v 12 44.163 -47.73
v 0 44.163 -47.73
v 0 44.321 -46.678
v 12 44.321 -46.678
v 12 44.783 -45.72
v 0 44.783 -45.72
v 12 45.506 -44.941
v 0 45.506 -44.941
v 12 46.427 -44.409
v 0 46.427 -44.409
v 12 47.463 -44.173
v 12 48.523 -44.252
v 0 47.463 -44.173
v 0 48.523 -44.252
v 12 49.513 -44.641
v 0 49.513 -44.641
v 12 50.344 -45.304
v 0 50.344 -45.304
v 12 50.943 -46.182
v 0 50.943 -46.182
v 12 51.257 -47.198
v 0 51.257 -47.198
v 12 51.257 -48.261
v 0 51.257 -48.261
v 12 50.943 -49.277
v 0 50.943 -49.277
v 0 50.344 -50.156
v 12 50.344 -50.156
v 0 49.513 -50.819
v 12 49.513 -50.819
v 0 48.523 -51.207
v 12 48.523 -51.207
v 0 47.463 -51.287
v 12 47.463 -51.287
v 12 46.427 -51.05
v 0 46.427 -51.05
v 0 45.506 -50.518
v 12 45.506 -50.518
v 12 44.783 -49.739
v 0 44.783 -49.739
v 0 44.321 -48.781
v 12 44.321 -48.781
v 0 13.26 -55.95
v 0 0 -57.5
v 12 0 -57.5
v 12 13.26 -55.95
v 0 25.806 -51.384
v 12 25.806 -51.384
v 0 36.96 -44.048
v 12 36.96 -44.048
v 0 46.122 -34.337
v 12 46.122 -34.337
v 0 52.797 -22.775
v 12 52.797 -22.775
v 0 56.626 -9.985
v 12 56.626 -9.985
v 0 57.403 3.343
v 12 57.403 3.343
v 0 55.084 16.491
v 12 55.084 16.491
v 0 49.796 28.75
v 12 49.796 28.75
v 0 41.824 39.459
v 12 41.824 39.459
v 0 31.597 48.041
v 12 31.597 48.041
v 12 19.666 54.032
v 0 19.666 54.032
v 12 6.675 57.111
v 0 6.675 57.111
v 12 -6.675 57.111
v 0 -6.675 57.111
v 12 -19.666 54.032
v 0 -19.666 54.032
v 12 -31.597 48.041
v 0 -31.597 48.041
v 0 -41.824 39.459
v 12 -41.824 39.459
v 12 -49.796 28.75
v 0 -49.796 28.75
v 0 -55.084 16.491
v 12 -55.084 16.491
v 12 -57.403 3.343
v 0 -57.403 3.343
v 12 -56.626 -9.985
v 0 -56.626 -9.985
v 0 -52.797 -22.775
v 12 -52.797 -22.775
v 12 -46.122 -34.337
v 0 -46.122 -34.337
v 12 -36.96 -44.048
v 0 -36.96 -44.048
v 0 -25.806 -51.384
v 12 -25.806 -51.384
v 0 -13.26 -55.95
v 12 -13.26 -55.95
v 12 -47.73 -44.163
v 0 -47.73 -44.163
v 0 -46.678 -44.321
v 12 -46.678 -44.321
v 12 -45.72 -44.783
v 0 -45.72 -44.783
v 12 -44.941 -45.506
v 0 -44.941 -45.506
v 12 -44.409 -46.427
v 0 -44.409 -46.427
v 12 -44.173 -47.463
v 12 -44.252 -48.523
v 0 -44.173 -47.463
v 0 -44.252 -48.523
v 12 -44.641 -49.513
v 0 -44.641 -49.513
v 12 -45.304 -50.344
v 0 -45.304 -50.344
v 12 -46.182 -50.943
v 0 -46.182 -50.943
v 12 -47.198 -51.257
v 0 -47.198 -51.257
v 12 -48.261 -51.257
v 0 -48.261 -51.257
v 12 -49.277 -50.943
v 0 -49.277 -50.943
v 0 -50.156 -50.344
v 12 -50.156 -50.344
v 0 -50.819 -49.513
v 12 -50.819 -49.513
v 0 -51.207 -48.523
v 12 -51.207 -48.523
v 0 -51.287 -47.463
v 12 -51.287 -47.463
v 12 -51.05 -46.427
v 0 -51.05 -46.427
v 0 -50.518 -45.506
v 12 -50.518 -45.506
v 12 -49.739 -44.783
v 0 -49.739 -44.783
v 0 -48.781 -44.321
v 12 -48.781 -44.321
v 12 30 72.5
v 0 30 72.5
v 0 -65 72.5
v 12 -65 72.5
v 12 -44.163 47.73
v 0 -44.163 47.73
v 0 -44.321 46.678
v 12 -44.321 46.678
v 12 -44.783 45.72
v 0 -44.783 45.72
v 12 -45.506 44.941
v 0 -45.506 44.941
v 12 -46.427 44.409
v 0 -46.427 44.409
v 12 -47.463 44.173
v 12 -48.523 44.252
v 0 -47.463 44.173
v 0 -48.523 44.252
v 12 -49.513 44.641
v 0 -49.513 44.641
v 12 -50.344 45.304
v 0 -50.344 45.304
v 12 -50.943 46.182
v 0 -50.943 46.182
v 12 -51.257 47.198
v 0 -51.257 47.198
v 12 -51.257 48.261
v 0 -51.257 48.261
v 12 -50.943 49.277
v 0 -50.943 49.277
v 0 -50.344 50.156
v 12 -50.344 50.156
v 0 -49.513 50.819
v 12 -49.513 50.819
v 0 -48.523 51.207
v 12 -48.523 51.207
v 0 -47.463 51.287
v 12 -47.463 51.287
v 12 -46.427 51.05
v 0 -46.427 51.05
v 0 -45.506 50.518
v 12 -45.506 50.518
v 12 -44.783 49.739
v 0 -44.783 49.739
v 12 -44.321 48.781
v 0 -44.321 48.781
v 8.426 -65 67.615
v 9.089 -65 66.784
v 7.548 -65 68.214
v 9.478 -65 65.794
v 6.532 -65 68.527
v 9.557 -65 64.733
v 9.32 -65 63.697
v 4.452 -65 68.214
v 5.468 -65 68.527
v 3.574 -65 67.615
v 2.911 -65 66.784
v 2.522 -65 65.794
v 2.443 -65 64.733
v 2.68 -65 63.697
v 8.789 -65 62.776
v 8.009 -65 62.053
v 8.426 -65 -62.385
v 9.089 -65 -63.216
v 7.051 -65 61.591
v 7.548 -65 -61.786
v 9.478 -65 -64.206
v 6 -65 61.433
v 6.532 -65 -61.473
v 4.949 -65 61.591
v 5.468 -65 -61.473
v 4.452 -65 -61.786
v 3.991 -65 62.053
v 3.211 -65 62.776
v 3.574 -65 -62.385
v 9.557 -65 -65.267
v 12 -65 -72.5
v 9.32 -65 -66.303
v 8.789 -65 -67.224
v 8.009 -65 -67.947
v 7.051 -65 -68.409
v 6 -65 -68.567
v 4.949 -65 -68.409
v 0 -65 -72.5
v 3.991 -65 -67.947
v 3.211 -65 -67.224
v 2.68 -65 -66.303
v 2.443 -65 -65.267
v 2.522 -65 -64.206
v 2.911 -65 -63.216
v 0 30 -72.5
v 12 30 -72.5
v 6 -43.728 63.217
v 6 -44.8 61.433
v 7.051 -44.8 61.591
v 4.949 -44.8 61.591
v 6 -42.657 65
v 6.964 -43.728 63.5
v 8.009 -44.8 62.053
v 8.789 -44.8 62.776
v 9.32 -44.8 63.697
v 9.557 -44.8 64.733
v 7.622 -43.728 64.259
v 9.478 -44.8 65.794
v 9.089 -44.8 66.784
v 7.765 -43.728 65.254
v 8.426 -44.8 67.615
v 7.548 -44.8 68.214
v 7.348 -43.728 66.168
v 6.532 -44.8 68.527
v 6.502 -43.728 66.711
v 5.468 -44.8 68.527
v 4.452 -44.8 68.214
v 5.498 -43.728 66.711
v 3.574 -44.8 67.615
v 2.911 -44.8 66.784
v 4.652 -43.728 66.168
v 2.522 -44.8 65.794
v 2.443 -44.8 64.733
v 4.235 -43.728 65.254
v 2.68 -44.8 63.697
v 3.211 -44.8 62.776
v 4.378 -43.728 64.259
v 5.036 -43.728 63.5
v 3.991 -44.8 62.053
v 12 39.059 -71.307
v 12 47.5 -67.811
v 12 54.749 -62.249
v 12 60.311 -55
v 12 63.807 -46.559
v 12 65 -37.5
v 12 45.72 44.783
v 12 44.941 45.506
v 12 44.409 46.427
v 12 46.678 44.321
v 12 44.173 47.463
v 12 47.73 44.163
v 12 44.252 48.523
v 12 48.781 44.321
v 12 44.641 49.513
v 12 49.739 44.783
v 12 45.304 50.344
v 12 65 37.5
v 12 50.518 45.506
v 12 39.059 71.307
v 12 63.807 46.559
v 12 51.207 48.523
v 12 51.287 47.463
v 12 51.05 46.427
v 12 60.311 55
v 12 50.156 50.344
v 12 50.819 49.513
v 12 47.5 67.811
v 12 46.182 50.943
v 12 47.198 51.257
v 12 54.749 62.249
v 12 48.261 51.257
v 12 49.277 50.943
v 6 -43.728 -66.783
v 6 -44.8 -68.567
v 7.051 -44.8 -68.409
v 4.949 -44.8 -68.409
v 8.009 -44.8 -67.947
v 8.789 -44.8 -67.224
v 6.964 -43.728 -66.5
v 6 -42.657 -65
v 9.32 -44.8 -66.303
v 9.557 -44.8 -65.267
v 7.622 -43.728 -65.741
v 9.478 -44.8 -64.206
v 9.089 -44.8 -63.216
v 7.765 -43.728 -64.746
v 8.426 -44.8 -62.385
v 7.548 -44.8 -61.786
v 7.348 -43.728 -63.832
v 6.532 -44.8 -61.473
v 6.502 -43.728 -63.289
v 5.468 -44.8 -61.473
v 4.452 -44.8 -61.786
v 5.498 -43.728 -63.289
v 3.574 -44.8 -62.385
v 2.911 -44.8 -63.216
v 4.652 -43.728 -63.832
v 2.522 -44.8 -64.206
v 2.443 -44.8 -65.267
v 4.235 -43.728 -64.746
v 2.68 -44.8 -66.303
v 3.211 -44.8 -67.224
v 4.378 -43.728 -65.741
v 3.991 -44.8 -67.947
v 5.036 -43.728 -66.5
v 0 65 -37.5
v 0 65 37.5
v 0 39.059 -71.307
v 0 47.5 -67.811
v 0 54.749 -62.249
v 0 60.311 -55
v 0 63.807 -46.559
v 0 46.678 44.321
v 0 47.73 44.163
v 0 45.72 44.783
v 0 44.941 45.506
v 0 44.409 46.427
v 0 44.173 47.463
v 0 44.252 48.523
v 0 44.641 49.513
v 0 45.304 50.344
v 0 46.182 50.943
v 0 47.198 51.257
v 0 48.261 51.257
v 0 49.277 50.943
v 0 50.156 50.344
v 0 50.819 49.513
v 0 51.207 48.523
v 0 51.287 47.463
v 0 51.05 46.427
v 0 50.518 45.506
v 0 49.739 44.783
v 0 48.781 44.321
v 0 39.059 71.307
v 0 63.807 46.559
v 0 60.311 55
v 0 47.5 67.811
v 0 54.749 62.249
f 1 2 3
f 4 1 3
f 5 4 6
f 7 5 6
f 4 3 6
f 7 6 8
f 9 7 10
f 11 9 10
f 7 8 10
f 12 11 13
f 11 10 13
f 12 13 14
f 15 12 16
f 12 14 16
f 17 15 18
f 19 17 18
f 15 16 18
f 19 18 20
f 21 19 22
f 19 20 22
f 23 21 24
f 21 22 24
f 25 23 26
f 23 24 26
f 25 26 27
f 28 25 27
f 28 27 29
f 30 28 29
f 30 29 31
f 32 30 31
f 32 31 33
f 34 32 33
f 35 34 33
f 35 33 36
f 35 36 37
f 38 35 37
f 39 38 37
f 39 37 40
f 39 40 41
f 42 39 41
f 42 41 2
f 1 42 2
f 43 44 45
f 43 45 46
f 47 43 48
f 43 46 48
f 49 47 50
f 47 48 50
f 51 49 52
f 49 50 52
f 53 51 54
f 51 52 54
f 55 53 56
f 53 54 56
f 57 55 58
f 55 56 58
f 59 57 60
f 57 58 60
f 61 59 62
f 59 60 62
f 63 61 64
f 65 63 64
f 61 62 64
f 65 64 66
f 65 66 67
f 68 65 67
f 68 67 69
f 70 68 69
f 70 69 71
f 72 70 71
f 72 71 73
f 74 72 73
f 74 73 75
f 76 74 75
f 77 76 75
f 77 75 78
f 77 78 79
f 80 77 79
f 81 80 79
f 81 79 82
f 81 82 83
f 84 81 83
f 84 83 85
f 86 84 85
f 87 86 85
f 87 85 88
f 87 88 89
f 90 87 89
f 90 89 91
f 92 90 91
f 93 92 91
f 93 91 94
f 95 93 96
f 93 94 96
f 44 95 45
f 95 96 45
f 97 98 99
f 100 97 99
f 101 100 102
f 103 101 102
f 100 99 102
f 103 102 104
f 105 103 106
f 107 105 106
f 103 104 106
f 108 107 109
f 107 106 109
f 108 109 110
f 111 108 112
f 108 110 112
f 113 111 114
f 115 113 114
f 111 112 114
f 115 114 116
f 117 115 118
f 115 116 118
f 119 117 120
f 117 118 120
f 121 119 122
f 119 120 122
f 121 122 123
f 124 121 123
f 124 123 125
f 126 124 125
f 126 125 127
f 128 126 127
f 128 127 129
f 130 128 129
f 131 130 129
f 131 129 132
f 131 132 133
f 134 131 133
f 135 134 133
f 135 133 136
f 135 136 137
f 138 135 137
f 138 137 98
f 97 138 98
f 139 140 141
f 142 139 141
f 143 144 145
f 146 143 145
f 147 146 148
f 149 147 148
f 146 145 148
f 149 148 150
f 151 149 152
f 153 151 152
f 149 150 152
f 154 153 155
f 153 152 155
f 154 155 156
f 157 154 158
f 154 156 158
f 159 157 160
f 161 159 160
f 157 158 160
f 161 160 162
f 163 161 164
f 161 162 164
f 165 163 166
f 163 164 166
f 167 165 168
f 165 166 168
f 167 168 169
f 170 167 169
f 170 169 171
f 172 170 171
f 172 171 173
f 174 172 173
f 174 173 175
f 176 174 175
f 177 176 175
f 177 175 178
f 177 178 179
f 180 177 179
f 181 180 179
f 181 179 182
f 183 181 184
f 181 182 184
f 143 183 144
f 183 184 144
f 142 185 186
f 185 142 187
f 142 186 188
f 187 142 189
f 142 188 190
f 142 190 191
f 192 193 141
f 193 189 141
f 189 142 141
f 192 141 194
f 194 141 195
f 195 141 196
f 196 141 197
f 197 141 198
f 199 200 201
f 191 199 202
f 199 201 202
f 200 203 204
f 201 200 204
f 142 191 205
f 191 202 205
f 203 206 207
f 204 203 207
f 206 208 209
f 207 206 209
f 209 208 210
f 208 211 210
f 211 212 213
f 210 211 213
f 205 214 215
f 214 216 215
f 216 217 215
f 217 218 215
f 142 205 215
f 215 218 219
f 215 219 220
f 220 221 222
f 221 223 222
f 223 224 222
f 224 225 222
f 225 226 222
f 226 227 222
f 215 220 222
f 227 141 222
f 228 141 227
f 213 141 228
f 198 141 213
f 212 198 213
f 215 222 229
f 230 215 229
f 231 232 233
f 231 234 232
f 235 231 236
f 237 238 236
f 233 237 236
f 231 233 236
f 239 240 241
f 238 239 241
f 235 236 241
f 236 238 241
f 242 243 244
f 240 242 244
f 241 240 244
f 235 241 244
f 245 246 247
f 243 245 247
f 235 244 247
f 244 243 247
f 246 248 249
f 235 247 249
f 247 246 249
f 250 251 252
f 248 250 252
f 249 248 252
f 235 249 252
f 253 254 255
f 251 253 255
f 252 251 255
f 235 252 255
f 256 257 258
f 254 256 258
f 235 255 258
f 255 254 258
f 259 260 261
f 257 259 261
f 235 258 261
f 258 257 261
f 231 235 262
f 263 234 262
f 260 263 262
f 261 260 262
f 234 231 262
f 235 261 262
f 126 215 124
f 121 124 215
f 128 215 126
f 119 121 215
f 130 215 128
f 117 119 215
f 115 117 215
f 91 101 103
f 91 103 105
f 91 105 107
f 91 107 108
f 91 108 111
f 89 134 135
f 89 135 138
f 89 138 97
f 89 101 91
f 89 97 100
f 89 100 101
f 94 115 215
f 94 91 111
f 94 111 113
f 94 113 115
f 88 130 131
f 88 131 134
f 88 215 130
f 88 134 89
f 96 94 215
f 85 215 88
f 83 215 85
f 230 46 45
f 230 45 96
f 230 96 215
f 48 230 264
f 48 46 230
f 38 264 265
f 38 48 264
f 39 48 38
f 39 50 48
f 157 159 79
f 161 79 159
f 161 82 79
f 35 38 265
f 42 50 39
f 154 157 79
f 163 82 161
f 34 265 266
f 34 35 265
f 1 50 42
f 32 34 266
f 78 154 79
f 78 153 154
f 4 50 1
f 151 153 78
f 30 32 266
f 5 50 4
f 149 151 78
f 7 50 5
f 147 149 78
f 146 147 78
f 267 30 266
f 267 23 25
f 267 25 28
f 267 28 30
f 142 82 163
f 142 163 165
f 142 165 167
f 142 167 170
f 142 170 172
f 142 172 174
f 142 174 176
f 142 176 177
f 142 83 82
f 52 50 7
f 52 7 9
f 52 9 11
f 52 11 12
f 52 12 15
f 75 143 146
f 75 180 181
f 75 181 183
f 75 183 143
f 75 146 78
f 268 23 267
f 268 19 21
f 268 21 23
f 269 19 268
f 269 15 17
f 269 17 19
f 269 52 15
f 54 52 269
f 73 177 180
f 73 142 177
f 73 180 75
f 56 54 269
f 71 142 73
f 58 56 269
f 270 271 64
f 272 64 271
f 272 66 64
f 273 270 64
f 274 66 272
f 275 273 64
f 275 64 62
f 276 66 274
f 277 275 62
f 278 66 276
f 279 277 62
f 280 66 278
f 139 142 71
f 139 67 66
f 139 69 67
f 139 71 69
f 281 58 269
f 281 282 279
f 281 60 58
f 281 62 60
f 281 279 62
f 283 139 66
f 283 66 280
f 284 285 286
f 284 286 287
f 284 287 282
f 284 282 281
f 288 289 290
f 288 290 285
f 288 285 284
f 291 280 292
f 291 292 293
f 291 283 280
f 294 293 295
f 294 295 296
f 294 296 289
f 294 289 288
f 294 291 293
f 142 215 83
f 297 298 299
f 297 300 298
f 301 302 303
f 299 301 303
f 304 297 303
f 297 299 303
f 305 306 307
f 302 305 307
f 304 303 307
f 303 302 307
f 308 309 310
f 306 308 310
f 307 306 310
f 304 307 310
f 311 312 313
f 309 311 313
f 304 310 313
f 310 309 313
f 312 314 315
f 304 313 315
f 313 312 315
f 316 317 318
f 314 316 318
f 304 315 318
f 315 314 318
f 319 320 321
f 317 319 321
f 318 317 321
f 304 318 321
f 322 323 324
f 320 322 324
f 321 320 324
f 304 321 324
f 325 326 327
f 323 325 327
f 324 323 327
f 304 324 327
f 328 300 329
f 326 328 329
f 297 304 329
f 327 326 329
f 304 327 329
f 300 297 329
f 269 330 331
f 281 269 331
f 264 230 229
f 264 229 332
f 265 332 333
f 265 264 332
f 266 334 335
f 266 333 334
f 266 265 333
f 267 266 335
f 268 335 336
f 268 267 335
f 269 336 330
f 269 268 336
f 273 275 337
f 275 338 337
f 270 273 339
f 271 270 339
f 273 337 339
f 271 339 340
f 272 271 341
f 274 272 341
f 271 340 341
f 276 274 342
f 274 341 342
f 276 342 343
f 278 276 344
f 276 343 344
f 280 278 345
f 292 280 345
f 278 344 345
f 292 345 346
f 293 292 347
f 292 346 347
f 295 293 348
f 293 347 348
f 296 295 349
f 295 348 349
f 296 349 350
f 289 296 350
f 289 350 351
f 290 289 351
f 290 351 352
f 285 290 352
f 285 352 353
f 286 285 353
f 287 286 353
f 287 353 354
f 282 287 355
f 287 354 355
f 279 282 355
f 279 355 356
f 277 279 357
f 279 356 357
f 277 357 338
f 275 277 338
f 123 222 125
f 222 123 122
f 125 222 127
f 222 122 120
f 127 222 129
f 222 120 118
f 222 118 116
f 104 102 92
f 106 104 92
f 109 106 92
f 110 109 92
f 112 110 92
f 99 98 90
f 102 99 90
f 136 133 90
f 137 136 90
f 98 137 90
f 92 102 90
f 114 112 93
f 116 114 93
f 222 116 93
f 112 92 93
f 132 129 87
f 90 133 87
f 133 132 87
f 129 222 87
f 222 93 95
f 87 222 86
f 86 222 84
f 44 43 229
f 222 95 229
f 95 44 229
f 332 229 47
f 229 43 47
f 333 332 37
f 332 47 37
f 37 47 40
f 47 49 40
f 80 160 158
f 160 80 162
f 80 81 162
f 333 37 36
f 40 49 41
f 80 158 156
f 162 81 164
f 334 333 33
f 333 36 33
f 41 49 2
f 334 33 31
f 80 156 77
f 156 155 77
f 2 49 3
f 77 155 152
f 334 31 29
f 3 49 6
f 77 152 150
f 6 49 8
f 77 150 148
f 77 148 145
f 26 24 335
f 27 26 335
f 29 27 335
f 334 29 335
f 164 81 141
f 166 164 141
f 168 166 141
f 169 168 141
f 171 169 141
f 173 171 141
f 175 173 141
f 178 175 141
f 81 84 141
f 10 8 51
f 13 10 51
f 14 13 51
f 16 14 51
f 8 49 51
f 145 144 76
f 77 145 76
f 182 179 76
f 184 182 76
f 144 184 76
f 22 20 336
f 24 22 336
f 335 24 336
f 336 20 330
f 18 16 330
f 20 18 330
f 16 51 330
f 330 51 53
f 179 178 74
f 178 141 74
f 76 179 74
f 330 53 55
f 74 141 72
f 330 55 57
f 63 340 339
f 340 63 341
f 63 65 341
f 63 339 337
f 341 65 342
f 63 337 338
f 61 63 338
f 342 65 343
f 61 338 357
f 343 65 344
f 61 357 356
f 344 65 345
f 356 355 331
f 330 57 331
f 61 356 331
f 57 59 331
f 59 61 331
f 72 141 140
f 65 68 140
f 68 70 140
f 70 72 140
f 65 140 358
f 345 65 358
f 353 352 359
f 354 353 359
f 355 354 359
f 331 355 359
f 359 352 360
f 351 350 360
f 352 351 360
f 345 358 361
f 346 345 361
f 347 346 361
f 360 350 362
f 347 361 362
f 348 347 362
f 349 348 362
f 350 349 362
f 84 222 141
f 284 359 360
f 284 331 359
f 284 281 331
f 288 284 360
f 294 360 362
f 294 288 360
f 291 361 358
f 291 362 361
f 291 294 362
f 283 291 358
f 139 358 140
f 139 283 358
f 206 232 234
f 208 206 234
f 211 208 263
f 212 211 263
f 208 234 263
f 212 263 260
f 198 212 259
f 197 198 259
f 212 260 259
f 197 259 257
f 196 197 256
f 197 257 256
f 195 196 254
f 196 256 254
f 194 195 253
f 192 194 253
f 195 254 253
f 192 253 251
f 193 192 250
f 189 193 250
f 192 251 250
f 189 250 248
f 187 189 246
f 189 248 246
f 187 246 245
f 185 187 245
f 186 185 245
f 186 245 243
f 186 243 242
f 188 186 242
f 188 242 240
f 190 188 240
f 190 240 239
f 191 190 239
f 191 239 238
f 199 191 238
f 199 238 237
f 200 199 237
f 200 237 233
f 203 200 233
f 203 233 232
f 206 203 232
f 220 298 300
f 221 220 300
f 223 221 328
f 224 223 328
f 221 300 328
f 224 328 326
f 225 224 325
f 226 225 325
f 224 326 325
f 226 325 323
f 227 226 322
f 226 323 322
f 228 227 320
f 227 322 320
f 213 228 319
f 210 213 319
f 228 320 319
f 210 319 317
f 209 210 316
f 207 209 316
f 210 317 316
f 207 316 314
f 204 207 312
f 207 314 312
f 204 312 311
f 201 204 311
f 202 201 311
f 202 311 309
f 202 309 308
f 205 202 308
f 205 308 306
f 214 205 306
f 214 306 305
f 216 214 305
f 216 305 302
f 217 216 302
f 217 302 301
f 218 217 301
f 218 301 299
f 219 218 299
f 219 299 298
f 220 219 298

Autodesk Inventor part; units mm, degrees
ref_plane "YZ Plane" through (0, 0, 0) normal (1, 0, 0) x (0, 1, 0)
ref_plane "XZ Plane" through (0, 0, 0) normal (0, 1, 0) x (-1, 0, 0)
ref_plane "XY Plane" through (0, 0, 0) normal (0, 0, 1) x (1, 0, 0)
sketch "Sketch1" plane through (0, 0, 0) normal (1, 0, 0) x (0, 1, 0)
  line L0 (-65, -72.5) -> (65, -72.5)
  line L1 (65, -72.5) -> (65, 72.5)
  line L2 (65, 72.5) -> (-65, 72.5)
  line L3 (-65, 72.5) -> (-65, -72.5)
  line L4 (-65, -72.5) -> (65, 72.5) construction
  line L5 (65, -72.5) -> (-65, 72.5) construction
  point P0 (0, 0)
  dimension "d0" = 130
  dimension "d1" = 145
extrude "Extrusion1" add sketch "Sketch1" along normal blind 12
fillet "Fillet1" radius 35 2 edges at (6, 65, 72.5) (6, 65, -72.5)
sketch "Sketch2" plane through (0, -65, -72.5) normal (0, -1, 0) x (1, 0, 0)
  line L0 (0, 145) -> (12, 145) projected
  line L1 (0, 0) -> (12, 0) projected
  line L2 (12, 145) -> (12, 0) projected
  point P0 (0, 72.5)
  point P1 (6, 137.5)
  point P2 (6, 7.5)
  point P3 (6, 145)
  point P4 (6, 0)
  dimension "d5" = 7.5
  dimension "d6" = 7.5
  dimension "d7" = 6
  dimension "d8" = 6
hole "Hole1" at (6, -65, 65) at (6, -65, -65) direction (0, 1, 0) diameter 7.134 depth 20.2 tip angle 118 thread size "M8x0.8" class "6H" standard "ISO Metric profile"
sketch "Sketch3" plane through (12, 0, 0) normal (1, 0, 0) x (0, 0, -1)
  circle A0 centre (0, 0) radius 57.5
  dimension "d16" = 115
extrude "Extrusion2" cut sketch "Sketch3" against normal blind 12
sketch "Sketch4" plane through (12, 0, 0) normal (1, 0, 0) x (0, 0, -1)
  circle A0 centre (0, 0) radius 67.5 construction
  line L0 (0, 0) -> (-82.2434, 82.2434) construction
  line L1 (0, 0) -> (116.3098, 0) construction
  point P0 (-47.7297, 47.7297)
  dimension "d19" = 135
  dimension "d20" = 135
hole "Hole2" at (12, 47.7297, 47.7297) direction (-1, 0, 0) diameter 7.134 depth 20.2 tip angle 118 thread size "M8x0.8" class "6H" standard "ISO Metric profile"
pattern_circular "Circular Pattern1" count 4 over 360 about axis through (-10, 0, 0) along (1, 0, 0) of "Hole2"
properties part number "Gear_support"
